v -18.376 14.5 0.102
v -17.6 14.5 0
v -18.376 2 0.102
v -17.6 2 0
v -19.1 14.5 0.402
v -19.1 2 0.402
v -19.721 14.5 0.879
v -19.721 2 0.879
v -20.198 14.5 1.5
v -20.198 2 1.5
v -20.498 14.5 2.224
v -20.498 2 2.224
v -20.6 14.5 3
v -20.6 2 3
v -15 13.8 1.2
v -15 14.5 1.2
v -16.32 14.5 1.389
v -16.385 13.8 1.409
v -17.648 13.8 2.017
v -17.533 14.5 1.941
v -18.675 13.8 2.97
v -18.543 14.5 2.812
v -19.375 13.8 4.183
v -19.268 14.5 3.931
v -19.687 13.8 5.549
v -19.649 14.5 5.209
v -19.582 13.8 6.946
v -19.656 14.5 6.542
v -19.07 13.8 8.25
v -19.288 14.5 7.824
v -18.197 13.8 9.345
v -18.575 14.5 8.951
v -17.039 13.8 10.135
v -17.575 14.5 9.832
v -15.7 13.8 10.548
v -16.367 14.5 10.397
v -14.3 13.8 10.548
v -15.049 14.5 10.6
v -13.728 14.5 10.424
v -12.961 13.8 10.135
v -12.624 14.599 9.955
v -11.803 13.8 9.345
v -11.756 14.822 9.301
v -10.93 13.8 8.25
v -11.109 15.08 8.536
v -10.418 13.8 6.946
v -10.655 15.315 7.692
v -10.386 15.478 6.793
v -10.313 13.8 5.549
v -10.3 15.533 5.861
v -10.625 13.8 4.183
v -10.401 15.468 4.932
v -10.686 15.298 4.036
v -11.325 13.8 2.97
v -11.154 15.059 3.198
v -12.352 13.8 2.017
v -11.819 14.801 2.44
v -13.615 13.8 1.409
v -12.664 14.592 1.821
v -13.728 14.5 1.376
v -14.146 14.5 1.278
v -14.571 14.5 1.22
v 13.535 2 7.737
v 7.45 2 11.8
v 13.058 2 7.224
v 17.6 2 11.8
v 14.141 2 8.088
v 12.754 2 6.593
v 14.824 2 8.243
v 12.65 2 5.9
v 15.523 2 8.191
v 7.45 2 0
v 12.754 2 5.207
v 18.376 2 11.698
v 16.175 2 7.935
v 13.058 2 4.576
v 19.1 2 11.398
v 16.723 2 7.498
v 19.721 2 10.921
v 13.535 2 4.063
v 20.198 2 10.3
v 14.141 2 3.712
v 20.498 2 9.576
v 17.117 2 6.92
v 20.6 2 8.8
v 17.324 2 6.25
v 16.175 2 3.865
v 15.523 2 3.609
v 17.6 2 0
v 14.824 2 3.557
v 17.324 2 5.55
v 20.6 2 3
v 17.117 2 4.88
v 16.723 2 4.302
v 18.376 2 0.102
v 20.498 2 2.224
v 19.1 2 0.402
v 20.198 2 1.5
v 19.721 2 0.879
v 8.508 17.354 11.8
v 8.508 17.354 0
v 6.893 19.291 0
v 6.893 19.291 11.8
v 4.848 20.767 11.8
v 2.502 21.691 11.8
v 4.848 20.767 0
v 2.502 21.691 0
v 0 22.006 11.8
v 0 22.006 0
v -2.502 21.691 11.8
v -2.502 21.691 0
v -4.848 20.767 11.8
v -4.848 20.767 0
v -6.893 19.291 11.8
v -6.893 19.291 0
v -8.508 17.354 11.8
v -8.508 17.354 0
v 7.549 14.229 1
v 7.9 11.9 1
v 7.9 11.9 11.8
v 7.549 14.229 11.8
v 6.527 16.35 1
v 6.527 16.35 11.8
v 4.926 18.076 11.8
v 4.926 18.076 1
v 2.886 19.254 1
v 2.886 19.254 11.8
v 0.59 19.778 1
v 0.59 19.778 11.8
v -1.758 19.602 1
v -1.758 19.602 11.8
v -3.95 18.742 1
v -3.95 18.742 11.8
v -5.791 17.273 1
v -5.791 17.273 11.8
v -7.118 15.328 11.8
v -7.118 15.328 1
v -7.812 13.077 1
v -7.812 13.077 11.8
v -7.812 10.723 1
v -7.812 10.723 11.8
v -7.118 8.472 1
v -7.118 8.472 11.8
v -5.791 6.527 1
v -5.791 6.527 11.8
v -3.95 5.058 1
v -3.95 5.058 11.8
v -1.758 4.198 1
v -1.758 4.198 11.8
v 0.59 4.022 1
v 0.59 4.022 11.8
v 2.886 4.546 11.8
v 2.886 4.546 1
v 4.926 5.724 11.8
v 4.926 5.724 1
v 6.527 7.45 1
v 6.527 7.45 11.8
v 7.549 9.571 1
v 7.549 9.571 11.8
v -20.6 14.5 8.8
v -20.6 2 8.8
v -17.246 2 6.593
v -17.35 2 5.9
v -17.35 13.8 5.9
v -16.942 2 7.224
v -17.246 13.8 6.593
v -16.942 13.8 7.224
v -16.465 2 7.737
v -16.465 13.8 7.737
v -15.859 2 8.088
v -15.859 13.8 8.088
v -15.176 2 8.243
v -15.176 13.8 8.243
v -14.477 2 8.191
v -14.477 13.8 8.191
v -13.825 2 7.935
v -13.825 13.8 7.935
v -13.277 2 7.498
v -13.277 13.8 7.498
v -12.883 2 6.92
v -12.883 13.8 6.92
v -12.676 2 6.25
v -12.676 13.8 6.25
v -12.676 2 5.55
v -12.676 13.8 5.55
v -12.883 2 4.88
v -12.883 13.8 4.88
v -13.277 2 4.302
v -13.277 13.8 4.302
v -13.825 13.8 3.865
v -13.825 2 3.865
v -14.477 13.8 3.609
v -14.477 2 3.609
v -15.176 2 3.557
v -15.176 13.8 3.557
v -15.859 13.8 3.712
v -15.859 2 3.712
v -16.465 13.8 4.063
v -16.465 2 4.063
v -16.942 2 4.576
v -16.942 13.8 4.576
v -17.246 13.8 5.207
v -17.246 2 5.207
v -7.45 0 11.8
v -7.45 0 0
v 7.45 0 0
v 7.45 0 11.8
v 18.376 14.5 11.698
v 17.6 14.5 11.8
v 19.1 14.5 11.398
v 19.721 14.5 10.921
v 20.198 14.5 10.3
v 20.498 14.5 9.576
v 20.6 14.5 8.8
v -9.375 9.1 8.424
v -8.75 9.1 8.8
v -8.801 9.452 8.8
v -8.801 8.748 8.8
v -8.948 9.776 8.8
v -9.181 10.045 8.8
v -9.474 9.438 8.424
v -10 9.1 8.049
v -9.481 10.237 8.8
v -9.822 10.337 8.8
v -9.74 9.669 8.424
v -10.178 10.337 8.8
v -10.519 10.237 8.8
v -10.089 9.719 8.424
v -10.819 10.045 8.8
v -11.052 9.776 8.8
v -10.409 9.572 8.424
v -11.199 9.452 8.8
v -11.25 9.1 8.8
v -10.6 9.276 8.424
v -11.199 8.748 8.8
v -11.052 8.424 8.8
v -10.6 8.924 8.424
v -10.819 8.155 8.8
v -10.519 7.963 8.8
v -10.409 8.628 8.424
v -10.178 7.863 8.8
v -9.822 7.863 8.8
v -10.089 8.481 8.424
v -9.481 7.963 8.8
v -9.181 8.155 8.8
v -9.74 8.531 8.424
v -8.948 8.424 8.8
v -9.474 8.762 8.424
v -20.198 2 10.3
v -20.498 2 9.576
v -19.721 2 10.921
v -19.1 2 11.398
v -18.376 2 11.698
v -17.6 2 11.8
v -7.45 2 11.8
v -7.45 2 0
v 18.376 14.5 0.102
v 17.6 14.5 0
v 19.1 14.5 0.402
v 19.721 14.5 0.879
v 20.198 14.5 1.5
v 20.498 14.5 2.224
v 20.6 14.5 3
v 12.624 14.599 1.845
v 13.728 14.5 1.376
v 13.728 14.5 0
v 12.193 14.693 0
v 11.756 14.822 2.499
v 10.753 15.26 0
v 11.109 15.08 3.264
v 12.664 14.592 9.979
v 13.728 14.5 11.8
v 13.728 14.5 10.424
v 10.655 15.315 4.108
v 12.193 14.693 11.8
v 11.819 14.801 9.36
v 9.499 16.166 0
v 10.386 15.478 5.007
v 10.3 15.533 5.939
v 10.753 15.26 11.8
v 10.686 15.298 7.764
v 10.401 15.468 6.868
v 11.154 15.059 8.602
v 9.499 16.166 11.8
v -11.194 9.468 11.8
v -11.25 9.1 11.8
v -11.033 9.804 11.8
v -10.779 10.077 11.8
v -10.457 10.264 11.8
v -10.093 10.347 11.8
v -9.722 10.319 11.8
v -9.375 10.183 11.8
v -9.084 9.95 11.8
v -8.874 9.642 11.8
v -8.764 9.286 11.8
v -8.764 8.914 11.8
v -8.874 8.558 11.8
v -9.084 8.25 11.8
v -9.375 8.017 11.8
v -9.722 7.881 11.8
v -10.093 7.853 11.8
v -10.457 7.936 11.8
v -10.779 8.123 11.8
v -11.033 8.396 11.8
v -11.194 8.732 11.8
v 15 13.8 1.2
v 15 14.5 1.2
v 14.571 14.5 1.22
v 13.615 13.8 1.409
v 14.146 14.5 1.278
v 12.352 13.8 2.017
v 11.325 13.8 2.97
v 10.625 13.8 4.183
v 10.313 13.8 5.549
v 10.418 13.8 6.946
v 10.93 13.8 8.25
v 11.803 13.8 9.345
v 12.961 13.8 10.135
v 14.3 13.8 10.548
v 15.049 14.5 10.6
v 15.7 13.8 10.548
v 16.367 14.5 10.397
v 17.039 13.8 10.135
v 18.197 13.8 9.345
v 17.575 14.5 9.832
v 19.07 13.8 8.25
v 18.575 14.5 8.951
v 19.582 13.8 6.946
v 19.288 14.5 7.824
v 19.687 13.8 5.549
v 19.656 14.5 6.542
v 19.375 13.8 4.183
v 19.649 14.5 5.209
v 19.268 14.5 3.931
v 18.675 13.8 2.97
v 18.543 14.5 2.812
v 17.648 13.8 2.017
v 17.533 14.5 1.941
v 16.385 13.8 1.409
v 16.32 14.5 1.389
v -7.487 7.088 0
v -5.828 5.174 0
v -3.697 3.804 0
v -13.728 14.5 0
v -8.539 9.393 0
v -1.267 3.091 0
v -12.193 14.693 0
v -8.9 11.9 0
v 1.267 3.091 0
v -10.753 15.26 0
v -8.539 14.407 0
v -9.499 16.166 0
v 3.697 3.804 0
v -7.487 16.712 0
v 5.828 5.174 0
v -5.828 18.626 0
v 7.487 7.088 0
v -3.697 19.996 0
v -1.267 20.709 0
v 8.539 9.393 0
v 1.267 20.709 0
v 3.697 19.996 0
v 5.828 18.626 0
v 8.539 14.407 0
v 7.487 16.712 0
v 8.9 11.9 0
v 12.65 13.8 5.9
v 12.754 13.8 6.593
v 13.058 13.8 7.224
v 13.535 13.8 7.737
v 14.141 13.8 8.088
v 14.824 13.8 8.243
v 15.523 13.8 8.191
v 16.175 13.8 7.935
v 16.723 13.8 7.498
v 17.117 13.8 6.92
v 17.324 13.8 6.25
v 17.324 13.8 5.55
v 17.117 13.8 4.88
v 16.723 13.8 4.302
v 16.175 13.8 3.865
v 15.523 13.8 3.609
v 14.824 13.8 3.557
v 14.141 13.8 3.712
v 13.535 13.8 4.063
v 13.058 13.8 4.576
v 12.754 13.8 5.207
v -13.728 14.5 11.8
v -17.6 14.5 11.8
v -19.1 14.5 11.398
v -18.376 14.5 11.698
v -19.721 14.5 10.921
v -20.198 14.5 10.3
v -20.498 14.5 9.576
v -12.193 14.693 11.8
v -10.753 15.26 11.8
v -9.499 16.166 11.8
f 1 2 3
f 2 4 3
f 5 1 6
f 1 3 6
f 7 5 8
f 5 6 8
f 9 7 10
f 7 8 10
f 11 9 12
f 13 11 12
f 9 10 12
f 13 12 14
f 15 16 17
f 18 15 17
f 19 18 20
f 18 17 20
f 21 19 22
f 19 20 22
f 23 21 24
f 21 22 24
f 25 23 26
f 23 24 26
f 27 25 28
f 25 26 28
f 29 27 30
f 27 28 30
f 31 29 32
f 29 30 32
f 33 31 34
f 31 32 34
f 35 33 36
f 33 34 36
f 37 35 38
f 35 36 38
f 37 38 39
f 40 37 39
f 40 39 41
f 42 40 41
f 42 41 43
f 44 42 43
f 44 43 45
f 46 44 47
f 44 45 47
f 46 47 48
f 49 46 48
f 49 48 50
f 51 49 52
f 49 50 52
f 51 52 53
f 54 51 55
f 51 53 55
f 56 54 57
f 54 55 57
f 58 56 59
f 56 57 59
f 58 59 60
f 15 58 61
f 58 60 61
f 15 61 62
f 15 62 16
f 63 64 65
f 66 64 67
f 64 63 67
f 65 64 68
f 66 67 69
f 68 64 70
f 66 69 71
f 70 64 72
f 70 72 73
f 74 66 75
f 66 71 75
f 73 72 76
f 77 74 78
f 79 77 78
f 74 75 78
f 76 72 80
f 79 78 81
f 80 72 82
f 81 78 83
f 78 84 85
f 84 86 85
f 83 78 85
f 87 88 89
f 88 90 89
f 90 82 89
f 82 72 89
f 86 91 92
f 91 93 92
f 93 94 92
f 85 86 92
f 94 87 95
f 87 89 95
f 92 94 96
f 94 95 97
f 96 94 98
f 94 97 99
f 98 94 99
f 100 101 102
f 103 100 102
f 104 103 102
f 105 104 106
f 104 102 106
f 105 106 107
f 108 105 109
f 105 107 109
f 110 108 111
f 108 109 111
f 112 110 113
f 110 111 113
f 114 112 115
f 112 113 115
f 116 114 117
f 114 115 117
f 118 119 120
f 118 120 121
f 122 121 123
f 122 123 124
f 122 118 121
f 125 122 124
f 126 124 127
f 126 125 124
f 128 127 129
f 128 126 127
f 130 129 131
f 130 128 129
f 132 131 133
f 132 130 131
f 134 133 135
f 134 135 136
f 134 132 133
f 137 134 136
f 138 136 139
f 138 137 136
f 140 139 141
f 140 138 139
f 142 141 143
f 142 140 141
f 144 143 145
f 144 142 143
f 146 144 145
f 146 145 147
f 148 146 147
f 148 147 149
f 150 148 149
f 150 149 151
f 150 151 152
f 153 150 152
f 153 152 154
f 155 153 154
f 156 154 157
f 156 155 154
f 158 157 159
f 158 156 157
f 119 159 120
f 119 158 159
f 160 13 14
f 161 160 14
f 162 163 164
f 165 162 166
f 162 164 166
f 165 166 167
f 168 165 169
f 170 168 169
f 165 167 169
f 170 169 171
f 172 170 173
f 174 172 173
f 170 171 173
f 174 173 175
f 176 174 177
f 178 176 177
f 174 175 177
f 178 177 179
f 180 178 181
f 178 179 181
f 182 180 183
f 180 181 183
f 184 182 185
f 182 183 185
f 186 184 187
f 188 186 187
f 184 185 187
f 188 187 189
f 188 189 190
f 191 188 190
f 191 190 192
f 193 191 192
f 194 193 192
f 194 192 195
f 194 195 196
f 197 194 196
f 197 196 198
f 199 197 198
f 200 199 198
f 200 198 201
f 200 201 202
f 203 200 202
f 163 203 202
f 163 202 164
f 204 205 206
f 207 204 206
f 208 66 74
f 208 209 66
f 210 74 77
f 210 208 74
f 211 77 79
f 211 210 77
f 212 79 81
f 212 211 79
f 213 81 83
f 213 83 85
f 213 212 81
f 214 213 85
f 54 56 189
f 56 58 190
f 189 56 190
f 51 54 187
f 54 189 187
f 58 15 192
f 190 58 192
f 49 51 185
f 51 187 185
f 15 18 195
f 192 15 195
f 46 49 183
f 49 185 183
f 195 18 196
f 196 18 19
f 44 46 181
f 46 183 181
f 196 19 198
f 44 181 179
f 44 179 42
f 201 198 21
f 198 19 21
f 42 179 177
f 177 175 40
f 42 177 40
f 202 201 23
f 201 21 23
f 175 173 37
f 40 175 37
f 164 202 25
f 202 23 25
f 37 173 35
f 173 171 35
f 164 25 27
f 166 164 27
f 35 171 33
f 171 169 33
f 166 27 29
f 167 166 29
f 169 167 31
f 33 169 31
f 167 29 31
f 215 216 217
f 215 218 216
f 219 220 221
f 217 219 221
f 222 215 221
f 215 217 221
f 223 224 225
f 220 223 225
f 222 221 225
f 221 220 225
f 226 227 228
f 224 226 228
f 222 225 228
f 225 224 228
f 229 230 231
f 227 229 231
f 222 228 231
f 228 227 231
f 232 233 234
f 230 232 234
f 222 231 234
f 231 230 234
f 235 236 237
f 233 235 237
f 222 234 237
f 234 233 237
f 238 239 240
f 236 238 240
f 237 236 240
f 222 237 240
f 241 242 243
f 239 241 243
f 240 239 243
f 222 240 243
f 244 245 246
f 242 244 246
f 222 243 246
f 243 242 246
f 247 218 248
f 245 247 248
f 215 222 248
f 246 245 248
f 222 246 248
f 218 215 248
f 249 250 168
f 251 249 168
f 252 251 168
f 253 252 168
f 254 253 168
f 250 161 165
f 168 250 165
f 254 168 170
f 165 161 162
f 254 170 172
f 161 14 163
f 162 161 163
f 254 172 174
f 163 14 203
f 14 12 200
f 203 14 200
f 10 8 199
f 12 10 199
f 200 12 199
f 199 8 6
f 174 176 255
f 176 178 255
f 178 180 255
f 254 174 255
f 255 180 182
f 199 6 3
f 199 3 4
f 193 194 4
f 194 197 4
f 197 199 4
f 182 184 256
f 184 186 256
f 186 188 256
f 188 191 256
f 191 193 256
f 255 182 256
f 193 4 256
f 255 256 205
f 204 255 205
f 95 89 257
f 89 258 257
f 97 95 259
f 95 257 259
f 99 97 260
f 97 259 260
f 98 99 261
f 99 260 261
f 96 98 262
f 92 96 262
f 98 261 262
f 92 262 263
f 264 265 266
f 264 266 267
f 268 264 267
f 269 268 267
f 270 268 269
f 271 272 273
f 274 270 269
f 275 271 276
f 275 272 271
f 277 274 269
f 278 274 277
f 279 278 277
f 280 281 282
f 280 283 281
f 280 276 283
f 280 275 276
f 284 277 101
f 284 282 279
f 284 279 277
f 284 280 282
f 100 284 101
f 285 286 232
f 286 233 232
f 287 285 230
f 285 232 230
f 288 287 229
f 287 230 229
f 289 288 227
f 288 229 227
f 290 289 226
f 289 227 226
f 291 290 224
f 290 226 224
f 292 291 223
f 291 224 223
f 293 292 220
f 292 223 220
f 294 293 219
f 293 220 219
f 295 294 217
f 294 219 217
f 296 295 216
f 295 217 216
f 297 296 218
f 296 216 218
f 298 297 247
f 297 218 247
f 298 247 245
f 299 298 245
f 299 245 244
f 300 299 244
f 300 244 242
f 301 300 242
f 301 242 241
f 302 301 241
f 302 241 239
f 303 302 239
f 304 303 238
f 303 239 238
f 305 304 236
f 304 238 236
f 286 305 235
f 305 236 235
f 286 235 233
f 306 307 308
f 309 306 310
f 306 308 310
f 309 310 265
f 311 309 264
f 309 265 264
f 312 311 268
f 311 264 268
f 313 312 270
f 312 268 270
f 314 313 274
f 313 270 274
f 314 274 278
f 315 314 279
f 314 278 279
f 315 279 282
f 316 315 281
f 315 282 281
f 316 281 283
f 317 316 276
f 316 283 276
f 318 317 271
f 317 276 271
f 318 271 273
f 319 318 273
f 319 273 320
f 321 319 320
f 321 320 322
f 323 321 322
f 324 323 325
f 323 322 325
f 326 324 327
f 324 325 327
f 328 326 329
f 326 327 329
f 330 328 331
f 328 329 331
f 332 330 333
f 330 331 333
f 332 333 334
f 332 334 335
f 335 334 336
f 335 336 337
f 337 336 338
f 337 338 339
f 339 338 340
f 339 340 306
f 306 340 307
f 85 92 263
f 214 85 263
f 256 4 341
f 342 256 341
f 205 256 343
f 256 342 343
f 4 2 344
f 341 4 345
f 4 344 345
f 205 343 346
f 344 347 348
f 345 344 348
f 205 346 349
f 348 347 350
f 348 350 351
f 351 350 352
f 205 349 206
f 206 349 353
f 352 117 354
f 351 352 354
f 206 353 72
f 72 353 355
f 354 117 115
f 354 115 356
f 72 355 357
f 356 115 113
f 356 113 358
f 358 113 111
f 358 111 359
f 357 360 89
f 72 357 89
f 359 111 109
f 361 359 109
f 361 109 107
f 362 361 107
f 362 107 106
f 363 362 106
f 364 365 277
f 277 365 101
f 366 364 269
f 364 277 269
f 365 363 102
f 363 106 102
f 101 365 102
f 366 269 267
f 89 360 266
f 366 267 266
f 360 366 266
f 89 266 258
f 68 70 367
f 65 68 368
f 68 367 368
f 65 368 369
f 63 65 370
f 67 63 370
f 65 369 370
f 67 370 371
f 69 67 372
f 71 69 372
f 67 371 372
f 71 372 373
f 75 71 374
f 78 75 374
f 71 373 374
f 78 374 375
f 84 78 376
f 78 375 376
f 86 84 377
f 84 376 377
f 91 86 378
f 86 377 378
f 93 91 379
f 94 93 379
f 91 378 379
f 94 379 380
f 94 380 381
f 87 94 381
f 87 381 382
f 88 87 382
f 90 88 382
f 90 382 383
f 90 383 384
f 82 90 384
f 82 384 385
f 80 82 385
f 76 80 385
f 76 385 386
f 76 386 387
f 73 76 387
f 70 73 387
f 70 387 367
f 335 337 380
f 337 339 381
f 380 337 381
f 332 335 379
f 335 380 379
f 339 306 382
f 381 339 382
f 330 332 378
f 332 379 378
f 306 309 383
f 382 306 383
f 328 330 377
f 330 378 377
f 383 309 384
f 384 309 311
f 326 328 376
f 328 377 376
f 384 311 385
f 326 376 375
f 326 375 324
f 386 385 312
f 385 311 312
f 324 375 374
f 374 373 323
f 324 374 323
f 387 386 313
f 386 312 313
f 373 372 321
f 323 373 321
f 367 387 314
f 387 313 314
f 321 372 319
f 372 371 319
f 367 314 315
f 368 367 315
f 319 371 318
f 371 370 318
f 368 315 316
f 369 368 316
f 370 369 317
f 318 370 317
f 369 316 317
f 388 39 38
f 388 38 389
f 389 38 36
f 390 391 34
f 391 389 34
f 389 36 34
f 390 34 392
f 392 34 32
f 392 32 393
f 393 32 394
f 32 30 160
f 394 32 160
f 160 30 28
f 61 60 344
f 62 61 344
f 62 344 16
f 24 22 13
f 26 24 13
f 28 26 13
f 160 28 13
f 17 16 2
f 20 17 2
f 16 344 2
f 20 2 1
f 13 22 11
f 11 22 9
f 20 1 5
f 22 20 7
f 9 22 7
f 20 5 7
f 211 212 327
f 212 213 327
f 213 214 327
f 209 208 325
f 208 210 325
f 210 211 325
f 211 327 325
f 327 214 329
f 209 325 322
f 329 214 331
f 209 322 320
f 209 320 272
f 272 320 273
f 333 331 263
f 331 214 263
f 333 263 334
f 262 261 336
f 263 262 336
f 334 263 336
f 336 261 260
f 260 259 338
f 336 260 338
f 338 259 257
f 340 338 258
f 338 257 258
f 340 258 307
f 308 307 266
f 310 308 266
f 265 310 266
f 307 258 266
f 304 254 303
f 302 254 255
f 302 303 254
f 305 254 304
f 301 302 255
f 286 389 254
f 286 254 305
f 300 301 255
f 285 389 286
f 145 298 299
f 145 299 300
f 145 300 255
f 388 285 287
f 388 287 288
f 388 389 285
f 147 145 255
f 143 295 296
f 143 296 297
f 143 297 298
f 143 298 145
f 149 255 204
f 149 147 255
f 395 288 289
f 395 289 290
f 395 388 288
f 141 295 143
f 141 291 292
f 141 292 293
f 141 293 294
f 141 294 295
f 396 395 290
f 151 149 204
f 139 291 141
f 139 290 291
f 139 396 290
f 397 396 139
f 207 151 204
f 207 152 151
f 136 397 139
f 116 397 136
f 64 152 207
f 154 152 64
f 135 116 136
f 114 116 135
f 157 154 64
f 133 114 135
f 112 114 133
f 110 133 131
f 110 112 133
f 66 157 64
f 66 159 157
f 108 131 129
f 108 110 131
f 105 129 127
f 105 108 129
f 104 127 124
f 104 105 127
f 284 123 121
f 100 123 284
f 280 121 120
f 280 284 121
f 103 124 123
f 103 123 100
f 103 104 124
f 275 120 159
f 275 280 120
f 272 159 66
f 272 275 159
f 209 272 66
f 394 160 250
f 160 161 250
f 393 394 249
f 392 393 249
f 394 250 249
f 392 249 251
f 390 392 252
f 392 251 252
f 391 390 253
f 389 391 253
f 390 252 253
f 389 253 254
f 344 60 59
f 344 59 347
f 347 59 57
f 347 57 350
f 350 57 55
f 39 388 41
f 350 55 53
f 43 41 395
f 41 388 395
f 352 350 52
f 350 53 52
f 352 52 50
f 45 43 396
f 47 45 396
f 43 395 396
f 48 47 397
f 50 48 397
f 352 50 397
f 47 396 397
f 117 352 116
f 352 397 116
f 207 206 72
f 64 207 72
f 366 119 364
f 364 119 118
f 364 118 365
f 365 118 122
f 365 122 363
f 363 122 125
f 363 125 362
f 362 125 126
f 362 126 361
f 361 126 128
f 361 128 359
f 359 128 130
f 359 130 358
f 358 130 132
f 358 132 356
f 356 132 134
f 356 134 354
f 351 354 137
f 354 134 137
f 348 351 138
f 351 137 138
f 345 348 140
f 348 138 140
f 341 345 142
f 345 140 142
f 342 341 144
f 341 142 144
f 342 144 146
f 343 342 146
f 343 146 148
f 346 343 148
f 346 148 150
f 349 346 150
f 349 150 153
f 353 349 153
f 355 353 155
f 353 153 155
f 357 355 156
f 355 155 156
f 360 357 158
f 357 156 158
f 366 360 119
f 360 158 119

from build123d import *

# Parameters (mm, degrees)
SKETCH_3_R                       = 7.9
EXTRUDE_1_DEPTH                  = 11.8
FILLET_1_R                       = 6.2
FILLET_2_R                       = 3
CHAMFER_1_SIZE                   = 1
HOLE_WIZARD_4_7_4_7_2_D          = 4.7
SKETCH_18_W                      = 4.7
SKETCH_18_H                      = 8.206022117
HOLE_WIZARD_9_4_9_4_1_AT_2_COUNT = 2
HOLE_WIZARD_9_4_9_4_1_AT_2_PITCH = 30
HOLE_WIZARD_M3_2_D               = 2.5
HOLE_WIZARD_M3_2_DEPTH           = 3
HOLE_WIZARD_M3_2_TIP             = 0.751075774


with BuildPart() as part:
    # 스케치3 → 보스-돌출1 (new body)
    with BuildSketch(Plane.XY):
        with BuildLine():
            Line((-7.45, 0), (7.45, 0))
            Line((7.45, 0), (7.45, 2))
            Line((7.45, 2), (20.6, 2))
            Line((20.6, 2), (20.6, 14.5))
            Line((20.6, 14.5), (9.765842668, 14.5))
            ThreePointArc((9.765842668, 14.5), (0, 22.006022117), (-9.765842668, 14.5))
            Line((-9.765842668, 14.5), (-20.6, 14.5))
            Line((-20.6, 14.5), (-20.6, 2))
            Line((-20.6, 2), (-7.45, 2))
            Line((-7.45, 2), (-7.45, 0))
        make_face()
        with Locations((0, 11.9)):
            Circle(SKETCH_3_R, mode=Mode.SUBTRACT)
    extrude(amount=EXTRUDE_1_DEPTH)

    # 필렛1
    fillet_1_edges = [part.edges().sort_by_distance(p)[0] for p in [
        (-9.765842668, 14.5, 5.9),
        (9.765842668, 14.5, 5.9),
    ]]
    fillet(fillet_1_edges, radius=FILLET_1_R)

    # 필렛2
    fillet_2_edges = [part.edges().sort_by_distance(p)[0] for p in [
        (20.6, 8.25, 0),
        (20.6, 8.25, 11.8),
        (-20.6, 8.25, 11.8),
        (-20.6, 8.25, 0),
    ]]
    fillet(fillet_2_edges, radius=FILLET_2_R)

    # 모따기1
    chamfer_1_edges = [part.edges().sort_by_distance(p)[0] for p in [
        (-7.9, 11.9, 0),
    ]]
    chamfer(chamfer_1_edges, length=CHAMFER_1_SIZE)

    # Ø4.7 (4.7) 지름 구멍2 (through all)
    with Locations(Plane.XZ):
        with Locations((15, 5.9), (-15, 5.9)):
            Hole(HOLE_WIZARD_4_7_4_7_2_D / 2)

    # 스케치18 → Ø9.4 (9.4) 지름 구멍1 (revolve, cut)
    with BuildSketch(Plane(origin=(-15, 13.8, 5.9), x_dir=(0, 0, -1), z_dir=(1, 0, 0))):
        with Locations((2.35, 4.103011058)):
            Rectangle(SKETCH_18_W, SKETCH_18_H)
    hole_wizard_9_4_9_4_1 = revolve(axis=Axis((-15, 7.45, 5.9), (0, 1, 0)), mode=Mode.SUBTRACT)

    # Ø9.4 (9.4) 지름 구멍1 at 2: Ø9.4 (9.4) 지름 구멍1 ×2
    with Locations(*[(i * HOLE_WIZARD_9_4_9_4_1_AT_2_PITCH, 0, 0) for i in range(1, HOLE_WIZARD_9_4_9_4_1_AT_2_COUNT)]):
        add(hole_wizard_9_4_9_4_1, mode=Mode.SUBTRACT)

    # M3 나사 구멍2
    with Locations(Plane.XY.offset(11.8)):
        with Locations((-10, 9.1)):
            Hole(HOLE_WIZARD_M3_2_D / 2, depth=HOLE_WIZARD_M3_2_DEPTH)
            with Locations((0, 0, -(HOLE_WIZARD_M3_2_DEPTH + HOLE_WIZARD_M3_2_TIP / 2))):  # 118° drill point
                Cone(0, HOLE_WIZARD_M3_2_D / 2, HOLE_WIZARD_M3_2_TIP, mode=Mode.SUBTRACT)


solid = part.part
